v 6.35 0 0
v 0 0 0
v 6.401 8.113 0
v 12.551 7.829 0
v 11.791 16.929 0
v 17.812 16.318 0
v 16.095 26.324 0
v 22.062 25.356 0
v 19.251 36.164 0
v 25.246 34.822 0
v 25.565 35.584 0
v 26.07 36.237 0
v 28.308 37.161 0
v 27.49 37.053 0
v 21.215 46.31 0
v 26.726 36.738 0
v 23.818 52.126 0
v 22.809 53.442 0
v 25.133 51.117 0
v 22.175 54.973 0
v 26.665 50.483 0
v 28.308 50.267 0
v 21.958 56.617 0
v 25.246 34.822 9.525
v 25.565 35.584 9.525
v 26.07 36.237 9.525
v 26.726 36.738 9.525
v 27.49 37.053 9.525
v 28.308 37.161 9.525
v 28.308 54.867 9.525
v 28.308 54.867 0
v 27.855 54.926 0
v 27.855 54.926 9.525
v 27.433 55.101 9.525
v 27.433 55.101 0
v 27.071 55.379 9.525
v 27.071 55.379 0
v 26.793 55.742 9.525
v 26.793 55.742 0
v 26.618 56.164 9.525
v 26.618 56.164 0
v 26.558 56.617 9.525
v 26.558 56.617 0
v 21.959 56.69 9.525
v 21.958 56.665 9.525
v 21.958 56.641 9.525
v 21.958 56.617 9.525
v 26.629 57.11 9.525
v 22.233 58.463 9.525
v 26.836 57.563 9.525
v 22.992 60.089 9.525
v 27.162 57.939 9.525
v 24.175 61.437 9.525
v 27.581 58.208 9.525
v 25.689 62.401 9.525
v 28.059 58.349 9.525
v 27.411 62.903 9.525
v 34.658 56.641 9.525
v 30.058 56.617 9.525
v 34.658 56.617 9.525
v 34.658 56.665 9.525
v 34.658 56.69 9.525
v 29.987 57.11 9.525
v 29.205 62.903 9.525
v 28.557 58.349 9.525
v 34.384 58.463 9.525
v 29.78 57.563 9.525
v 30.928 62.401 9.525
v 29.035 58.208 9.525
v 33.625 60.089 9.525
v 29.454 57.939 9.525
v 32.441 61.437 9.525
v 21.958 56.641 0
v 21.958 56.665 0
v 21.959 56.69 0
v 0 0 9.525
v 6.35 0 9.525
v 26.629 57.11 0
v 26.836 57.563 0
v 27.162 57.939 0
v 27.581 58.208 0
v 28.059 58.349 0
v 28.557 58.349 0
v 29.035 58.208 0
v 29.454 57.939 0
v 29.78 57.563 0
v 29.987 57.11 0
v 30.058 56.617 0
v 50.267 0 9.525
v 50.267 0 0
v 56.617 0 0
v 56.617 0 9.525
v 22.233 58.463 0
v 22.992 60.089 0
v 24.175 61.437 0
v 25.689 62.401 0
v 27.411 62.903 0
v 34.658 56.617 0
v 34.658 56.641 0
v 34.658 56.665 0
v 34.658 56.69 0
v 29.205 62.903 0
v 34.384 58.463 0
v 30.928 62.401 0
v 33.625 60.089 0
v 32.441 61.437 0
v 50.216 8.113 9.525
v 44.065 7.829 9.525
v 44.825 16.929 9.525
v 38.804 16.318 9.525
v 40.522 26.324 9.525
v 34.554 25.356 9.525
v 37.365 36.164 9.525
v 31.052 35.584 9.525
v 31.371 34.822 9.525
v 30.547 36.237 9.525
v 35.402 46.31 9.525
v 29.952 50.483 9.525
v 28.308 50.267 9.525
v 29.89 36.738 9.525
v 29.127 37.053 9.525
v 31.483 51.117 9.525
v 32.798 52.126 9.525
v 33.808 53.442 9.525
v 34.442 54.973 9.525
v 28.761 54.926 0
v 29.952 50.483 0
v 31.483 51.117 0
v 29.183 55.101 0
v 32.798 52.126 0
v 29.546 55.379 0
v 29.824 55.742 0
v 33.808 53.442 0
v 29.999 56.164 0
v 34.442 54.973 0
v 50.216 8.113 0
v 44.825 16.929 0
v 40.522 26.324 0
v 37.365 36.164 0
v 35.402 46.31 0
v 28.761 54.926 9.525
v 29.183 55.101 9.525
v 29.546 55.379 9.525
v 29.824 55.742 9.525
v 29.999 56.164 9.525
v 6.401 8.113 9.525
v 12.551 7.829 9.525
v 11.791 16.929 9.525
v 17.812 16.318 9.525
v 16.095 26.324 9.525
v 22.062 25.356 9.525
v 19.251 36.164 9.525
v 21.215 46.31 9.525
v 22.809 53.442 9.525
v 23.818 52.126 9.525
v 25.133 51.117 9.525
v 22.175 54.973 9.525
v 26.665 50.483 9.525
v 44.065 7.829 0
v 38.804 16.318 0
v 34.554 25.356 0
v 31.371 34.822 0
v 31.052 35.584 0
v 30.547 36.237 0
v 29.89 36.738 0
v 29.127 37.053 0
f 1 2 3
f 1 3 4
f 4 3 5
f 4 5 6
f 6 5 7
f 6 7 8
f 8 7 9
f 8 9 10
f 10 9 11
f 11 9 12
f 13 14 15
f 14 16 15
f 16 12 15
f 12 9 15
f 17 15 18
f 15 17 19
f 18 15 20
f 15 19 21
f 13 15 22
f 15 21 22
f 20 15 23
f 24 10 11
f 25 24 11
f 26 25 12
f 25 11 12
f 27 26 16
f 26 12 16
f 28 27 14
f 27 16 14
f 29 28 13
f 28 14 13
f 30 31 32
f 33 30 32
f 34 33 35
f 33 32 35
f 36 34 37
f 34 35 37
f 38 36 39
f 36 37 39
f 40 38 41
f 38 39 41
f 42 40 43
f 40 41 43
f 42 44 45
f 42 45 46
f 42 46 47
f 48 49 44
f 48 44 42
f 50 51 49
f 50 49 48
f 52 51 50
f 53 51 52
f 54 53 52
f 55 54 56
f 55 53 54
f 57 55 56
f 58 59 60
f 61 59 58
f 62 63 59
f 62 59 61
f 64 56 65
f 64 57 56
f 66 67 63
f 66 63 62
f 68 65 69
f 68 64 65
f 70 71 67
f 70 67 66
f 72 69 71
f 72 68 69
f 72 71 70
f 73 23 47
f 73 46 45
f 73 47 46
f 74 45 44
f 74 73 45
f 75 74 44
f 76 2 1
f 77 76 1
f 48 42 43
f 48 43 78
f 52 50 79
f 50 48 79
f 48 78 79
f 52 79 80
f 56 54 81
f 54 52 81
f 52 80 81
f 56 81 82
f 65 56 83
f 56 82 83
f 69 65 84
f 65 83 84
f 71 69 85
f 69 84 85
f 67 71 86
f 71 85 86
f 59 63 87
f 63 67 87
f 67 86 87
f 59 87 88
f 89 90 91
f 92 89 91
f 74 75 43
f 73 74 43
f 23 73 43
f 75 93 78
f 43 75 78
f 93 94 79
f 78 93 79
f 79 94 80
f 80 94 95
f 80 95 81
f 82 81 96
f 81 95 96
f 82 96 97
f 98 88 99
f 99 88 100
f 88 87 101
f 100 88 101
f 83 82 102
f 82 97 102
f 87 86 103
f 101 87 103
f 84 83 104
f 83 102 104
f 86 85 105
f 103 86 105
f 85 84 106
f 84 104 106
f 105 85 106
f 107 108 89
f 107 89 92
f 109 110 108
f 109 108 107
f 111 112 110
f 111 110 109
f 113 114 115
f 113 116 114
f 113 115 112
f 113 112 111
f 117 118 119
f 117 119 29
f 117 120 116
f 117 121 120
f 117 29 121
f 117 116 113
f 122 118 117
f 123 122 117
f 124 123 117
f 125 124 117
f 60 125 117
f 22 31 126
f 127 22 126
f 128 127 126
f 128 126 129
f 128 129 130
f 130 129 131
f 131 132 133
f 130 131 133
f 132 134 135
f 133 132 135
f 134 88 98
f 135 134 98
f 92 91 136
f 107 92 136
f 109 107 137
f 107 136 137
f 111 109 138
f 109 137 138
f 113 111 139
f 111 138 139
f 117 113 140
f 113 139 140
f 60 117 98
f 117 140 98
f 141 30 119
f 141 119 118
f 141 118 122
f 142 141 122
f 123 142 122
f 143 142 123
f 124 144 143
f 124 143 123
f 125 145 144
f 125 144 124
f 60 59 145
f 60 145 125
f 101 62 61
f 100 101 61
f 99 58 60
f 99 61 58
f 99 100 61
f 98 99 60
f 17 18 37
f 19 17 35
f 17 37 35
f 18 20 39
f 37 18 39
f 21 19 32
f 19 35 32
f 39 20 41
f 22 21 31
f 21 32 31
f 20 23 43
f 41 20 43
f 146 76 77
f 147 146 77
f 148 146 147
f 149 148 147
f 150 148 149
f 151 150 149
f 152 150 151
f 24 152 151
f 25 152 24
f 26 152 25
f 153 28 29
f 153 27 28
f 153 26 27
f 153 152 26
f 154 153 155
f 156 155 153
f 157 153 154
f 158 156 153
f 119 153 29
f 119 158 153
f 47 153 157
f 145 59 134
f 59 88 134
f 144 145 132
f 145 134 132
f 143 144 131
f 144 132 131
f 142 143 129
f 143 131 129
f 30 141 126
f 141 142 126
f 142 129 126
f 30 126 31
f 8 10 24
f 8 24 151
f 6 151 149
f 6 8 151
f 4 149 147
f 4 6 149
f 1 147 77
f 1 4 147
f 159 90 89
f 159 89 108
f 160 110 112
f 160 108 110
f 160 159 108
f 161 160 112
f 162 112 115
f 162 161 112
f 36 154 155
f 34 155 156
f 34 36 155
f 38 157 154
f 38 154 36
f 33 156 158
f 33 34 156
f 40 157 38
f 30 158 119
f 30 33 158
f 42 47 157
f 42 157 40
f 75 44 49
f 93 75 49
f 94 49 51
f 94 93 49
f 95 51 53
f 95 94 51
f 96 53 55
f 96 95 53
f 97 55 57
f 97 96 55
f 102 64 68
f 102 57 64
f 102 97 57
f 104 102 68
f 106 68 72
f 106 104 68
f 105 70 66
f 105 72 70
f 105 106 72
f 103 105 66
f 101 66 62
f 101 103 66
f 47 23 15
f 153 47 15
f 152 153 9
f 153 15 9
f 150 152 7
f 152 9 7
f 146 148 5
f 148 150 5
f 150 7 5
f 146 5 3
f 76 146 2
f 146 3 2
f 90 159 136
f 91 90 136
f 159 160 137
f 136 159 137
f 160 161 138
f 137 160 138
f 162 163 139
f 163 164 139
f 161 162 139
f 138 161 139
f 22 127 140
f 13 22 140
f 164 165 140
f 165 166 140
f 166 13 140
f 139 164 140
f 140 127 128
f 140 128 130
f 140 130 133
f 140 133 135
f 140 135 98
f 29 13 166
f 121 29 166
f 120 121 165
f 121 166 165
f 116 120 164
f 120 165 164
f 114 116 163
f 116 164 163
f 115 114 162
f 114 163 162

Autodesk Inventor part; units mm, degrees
ref_plane "XZ Plane" through (0, 0, 0) normal (0, 1, 0) x (-1, 0, 0)
ref_plane "XY Plane" through (0, 0, 0) normal (0, 0, 1) x (1, 0, 0)
sketch "Sketch1" plane through (0, 0, 0) normal (0, 0, 1) x (1, 0, 0)
  line L0 (0, 0) -> (56.6166, 0)
  line L1 (56.6166, 0) -> (56.6166, 56.6166)
  line L2 (56.6166, 56.6166) -> (0, 56.6166)
  line L3 (0, 56.6166) -> (0, 0)
  circle A0 centre (28.3083, 56.6166) radius 1.75
  circle A1 centre (28.3083, 56.6166) radius 6.35
  arc A2 (0, 0) -> (21.9587, 56.6898) centre (-64.7797, 57.6901) ccw
  arc A3 (6.3496, 0) -> (25.2456, 34.8225) centre (-58.4301, 57.6901) ccw
  line L4 (28.3083, 0) -> (28.3083, 56.6898)
  arc A4 (34.6579, 56.6898) -> (56.6166, 0) centre (121.3963, 57.6901) ccw
  arc A5 (31.371, 34.8225) -> (50.267, 0) centre (115.0467, 57.6901) ccw
  arc A6 (31.371, 34.8225) -> (25.2456, 34.8225) centre (28.3083, 33.9855) ccw
  point P0 (21.9583, 56.6166)
  point P1 (21.9578, 56.6166)
  point P2 (6.3496, 0)
  point P3 (50.267, 0)
  point P4 (34.6588, 56.6166)
  point P5 (34.6583, 56.6166)
  dimension "d3" = 12.7
  dimension "d0" = 56.6166
  dimension "d1" = 56.6166
  dimension "d2" = 3.5
  dimension "d4" = 3.175
extrude "Extrusion1" add sketch "Sketch1" along normal blind 9.525 contours A2 A1 L4 A6 A3 L0 | A1 L2 A0 | L2 A0 L4 A1 | L4 A0 L2 A1 | A1 A4 L0 A5 A6 L4
ref_plane "Work Plane2" through (28.3083, 0, 0) normal (1, 0, 0) x (0, 1, 0)
ref_plane "Work Plane1" through (56.6166, 0, 0) normal (1, 0, 0) x (0, 1, 0)
properties part number "transfer gear rod support end"
